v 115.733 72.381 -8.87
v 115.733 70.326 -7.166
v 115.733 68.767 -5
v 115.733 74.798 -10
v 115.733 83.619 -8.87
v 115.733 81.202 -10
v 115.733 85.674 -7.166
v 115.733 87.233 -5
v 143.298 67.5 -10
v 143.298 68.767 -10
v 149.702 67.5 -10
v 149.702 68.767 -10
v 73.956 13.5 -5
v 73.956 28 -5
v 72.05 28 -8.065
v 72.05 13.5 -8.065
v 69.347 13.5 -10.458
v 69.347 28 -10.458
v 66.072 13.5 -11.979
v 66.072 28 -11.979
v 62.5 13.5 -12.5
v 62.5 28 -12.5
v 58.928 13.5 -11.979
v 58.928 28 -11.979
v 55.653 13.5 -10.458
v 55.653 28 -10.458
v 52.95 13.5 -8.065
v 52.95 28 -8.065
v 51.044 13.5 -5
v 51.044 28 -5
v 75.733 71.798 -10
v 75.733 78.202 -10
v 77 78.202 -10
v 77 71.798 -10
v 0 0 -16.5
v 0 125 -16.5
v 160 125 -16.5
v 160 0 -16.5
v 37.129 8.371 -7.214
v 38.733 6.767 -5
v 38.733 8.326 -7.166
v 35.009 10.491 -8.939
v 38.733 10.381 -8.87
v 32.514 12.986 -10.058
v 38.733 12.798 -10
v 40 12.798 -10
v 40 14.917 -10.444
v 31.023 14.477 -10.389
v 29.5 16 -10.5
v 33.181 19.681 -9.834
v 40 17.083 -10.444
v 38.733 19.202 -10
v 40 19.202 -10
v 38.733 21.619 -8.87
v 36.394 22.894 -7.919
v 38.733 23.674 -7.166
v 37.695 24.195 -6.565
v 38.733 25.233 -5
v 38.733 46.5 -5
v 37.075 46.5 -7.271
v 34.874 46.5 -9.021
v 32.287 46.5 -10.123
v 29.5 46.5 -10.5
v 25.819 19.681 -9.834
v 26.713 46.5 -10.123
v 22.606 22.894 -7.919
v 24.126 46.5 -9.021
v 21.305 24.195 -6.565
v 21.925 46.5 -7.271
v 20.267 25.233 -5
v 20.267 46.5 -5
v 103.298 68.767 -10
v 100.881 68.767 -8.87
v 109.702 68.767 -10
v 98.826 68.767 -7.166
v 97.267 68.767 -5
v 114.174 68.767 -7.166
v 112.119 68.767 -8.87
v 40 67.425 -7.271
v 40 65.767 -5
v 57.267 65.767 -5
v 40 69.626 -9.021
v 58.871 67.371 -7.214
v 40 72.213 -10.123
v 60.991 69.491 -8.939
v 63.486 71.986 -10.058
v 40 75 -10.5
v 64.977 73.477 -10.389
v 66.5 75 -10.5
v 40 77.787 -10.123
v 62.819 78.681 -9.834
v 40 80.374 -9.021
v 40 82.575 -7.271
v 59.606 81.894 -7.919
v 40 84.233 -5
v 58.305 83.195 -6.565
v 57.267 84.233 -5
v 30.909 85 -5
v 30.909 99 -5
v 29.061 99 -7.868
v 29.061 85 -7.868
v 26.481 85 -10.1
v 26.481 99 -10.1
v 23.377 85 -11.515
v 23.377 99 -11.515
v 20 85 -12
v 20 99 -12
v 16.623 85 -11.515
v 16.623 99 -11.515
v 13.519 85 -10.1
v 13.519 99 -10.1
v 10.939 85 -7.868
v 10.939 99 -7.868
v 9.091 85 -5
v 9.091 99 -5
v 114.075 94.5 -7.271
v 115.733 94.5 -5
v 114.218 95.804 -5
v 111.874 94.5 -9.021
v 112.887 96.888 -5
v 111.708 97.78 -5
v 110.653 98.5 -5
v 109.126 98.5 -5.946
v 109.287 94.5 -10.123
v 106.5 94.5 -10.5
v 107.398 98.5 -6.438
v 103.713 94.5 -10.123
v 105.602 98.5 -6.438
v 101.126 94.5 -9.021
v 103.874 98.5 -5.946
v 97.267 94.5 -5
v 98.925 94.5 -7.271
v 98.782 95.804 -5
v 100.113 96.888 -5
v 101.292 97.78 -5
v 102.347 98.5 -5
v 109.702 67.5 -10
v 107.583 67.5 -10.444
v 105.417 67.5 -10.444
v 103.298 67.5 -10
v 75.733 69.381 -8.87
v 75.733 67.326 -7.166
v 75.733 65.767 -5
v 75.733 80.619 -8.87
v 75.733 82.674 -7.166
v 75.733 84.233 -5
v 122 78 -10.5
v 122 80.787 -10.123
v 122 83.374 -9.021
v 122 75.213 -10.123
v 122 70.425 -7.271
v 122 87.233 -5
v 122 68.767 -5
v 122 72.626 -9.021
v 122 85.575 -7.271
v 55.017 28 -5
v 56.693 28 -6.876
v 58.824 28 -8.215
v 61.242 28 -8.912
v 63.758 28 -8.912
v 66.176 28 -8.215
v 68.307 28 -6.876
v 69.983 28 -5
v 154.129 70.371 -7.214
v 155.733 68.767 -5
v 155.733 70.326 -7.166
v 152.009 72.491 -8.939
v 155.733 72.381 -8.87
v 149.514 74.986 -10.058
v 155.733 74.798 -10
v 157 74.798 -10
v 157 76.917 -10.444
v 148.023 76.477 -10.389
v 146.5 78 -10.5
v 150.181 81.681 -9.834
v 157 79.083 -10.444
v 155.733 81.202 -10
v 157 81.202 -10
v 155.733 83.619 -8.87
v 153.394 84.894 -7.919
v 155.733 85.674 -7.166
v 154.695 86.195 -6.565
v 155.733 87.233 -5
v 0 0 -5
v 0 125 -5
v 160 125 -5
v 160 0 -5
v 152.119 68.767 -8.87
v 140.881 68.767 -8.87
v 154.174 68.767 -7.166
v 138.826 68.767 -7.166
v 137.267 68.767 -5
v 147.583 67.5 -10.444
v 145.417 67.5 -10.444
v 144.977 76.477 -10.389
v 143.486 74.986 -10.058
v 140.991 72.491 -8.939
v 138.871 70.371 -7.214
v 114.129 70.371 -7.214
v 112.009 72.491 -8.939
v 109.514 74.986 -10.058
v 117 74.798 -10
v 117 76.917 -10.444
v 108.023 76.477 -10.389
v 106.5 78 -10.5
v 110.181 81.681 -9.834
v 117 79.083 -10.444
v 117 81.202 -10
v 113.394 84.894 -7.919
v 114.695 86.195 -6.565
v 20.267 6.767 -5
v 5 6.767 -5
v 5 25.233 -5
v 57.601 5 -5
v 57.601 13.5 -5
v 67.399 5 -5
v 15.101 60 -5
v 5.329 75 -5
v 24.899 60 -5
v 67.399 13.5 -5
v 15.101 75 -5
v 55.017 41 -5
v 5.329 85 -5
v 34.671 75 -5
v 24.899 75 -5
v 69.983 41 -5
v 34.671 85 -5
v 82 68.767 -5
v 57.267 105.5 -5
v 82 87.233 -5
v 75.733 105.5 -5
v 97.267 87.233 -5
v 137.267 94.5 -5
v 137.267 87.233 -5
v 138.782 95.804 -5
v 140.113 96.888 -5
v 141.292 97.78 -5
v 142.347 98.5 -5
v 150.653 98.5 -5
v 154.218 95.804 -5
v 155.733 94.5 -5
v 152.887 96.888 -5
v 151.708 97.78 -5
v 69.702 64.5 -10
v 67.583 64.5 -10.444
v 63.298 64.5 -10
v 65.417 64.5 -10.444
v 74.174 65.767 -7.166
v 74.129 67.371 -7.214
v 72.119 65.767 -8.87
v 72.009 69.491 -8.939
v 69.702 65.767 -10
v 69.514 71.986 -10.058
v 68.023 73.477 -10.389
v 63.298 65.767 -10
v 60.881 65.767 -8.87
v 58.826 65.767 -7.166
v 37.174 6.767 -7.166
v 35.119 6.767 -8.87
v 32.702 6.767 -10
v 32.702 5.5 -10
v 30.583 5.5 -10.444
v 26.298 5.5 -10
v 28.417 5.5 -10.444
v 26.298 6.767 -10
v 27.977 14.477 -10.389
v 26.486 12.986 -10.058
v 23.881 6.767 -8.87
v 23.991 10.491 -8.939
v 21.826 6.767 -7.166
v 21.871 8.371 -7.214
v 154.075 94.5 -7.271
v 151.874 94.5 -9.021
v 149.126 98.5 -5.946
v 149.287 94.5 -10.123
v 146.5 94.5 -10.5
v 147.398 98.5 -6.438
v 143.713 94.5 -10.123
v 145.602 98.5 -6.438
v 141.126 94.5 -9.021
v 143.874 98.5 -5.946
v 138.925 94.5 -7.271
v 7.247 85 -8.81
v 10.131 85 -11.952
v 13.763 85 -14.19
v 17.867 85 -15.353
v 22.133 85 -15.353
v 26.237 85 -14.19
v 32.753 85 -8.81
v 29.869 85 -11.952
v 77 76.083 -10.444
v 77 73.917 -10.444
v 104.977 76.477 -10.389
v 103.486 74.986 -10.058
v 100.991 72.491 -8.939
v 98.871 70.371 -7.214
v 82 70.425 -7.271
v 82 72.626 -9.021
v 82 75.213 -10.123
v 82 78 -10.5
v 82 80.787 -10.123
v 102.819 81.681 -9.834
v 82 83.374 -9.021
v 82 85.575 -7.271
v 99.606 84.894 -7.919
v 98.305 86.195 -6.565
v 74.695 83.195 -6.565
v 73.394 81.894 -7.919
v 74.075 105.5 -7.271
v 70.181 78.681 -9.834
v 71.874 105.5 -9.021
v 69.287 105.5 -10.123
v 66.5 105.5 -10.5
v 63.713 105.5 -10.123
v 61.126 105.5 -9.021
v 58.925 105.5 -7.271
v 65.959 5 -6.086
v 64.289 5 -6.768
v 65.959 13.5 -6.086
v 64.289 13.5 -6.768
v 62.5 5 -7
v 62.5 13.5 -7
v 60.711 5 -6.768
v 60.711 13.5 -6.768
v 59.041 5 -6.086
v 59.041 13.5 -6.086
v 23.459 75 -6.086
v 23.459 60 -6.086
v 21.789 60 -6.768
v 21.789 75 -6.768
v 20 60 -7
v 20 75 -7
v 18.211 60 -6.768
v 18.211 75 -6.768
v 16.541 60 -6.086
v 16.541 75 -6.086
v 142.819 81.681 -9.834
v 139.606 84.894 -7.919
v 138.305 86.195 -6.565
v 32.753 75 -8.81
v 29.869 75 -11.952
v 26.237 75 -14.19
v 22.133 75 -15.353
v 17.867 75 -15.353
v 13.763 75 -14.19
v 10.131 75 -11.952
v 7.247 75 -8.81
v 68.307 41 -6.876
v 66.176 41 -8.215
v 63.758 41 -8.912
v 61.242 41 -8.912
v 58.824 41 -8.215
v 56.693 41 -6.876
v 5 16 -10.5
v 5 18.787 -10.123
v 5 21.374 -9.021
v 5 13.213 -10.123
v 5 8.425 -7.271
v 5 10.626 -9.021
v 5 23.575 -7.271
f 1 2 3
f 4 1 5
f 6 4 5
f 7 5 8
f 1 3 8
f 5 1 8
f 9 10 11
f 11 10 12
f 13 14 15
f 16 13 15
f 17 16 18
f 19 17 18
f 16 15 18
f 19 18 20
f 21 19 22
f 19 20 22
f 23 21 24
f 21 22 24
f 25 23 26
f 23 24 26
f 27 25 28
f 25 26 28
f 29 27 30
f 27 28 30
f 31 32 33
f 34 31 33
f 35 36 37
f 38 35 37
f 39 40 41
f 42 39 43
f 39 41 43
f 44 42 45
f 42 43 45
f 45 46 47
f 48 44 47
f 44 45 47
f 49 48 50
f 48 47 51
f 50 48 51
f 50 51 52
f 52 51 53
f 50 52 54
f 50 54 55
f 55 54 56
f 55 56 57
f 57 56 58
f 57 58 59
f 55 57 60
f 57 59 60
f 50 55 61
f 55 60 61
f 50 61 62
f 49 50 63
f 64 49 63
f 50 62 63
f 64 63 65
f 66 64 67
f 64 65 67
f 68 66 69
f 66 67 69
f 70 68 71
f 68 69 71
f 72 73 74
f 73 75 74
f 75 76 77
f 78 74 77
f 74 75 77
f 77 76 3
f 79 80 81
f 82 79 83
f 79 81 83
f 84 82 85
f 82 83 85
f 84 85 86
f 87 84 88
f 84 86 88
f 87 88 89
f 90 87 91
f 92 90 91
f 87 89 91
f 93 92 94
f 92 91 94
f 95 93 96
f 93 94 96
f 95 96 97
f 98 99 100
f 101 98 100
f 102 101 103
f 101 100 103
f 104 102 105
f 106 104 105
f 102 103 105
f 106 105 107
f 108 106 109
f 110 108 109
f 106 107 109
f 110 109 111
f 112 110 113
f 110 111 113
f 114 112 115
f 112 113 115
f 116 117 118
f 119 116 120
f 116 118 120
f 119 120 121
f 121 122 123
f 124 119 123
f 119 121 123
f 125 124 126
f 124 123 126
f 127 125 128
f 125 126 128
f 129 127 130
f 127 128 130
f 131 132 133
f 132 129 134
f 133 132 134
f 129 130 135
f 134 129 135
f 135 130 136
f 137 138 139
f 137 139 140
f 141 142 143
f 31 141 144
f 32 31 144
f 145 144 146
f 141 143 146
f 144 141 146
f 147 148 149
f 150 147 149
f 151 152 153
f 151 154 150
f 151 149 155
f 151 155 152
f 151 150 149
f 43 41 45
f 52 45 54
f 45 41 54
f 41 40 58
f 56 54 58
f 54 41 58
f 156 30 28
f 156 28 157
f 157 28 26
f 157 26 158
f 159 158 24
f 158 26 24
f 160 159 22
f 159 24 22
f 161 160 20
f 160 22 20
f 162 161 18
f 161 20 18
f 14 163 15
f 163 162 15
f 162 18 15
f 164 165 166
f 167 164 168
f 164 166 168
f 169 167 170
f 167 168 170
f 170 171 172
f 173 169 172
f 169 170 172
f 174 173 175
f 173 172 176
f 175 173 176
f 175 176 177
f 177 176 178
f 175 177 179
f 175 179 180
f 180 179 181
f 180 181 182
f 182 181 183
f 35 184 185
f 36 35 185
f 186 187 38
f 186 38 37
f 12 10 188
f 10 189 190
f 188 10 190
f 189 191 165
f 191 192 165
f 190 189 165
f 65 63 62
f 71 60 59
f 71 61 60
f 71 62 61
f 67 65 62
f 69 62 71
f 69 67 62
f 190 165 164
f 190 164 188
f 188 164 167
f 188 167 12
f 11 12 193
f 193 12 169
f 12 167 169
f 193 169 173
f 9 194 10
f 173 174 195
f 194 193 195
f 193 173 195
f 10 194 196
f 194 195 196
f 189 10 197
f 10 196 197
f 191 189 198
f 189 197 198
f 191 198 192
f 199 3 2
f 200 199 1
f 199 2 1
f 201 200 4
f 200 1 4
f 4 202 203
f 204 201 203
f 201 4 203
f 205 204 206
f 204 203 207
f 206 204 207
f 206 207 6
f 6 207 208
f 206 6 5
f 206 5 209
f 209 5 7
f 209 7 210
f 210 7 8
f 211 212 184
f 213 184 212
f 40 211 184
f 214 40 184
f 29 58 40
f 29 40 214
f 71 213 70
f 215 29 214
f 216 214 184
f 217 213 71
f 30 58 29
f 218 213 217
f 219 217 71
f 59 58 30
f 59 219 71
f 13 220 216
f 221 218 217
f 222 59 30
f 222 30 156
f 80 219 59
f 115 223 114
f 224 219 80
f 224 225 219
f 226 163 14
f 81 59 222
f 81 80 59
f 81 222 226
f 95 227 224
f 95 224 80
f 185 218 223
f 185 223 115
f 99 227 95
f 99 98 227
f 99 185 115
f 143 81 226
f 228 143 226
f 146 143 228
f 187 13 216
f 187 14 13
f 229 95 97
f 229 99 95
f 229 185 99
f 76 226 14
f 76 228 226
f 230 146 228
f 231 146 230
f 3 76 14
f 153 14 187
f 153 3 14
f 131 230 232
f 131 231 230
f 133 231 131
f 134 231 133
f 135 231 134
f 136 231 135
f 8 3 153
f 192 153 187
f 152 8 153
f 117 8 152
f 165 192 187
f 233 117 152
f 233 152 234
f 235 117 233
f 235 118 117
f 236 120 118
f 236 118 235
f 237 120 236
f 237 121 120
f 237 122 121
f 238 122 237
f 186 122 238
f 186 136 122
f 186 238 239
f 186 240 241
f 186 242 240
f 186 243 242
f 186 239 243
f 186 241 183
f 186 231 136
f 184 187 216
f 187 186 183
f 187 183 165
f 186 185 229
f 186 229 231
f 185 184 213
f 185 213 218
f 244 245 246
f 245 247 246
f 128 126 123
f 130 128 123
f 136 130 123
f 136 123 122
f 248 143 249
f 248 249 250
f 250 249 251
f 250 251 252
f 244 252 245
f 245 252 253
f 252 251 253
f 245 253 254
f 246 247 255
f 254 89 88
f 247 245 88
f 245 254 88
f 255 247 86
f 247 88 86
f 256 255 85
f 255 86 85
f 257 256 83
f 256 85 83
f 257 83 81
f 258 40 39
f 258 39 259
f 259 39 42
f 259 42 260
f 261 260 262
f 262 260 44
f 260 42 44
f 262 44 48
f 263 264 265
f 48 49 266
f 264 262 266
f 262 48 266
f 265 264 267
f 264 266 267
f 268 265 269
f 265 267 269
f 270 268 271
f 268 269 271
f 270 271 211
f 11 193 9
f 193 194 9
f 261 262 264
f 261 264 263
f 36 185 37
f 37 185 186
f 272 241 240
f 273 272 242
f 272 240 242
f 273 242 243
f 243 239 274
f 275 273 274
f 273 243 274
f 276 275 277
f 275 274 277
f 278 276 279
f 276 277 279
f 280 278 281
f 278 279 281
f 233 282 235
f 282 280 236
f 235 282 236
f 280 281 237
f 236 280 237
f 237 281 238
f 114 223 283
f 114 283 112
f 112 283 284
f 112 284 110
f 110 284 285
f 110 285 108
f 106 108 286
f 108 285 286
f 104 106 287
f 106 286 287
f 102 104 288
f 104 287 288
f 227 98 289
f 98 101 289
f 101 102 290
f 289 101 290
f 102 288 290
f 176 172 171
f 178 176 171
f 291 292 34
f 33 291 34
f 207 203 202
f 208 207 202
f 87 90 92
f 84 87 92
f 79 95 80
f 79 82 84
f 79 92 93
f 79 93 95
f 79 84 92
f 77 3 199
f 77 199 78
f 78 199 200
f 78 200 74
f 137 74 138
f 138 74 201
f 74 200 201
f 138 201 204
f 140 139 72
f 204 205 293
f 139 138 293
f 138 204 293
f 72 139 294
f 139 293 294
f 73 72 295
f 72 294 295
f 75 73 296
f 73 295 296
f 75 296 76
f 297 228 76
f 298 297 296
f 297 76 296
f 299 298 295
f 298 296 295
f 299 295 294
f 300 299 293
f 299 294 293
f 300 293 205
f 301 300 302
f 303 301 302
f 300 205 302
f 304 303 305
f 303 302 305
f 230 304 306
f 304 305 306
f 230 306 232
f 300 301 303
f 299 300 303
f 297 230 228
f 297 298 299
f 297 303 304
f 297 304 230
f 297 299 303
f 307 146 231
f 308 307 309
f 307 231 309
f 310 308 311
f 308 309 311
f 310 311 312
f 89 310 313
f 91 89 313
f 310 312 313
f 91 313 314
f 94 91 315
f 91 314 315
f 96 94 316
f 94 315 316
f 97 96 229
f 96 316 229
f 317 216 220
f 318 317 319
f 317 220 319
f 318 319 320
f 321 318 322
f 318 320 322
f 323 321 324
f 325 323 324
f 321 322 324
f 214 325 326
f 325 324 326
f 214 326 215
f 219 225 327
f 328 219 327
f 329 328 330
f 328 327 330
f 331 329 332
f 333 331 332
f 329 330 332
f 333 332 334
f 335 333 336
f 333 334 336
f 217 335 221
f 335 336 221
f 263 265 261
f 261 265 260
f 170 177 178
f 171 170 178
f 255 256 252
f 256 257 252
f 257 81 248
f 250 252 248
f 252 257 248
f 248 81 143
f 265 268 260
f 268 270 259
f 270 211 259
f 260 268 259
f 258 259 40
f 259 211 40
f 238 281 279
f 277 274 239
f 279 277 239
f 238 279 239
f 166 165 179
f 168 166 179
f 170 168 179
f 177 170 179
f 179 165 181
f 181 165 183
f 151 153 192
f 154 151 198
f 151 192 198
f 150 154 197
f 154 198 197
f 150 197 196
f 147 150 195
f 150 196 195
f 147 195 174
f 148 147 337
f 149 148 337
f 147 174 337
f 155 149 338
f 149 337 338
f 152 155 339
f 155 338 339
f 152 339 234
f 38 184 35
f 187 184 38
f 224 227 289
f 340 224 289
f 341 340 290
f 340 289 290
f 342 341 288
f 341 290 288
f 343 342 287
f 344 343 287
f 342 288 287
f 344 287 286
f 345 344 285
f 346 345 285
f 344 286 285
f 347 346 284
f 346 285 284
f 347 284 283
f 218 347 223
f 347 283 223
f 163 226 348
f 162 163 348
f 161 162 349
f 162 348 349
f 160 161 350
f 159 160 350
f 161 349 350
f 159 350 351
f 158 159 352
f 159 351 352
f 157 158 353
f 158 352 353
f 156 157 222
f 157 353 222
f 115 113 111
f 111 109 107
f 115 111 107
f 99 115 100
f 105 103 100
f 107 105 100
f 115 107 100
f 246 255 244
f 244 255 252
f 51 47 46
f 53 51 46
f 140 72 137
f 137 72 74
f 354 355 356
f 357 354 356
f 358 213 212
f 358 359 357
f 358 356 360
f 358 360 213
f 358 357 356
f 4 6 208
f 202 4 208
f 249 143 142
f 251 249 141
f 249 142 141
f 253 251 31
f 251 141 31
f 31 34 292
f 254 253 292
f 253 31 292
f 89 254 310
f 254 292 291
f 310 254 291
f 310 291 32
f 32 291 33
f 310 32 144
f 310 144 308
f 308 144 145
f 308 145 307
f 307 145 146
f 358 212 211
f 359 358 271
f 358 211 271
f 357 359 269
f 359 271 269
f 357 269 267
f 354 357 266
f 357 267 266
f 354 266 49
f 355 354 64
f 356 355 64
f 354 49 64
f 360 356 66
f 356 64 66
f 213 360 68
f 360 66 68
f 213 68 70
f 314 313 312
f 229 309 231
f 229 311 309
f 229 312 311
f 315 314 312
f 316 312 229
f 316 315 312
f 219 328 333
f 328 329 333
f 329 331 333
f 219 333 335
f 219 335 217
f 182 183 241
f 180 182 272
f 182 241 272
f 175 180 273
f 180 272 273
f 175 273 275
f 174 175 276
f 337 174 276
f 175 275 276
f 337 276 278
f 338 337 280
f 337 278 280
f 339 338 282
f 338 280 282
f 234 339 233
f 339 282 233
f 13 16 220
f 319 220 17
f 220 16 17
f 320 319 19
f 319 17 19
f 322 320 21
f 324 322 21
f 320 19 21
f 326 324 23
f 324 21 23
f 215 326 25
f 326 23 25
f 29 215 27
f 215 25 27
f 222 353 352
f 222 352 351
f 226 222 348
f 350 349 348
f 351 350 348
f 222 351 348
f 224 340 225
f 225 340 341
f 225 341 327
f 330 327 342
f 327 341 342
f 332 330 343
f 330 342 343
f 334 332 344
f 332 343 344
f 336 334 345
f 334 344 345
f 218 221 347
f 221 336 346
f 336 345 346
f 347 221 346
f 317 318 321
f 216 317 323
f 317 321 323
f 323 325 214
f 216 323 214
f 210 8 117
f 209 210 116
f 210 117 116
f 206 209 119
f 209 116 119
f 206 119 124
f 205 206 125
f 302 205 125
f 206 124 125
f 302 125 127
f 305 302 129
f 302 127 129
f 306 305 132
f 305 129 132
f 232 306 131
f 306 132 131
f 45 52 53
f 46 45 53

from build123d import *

# Parameters (mm, degrees)
F0_W      = 160
F0_H      = 125
F1_DEPTH  = 16.5
F4_W      = 35
F4_H      = 10.5
F6_W      = 37
F6_H      = 10.5
F8_W      = 10.5
F8_H      = 20
F8_H_2    = 21
F10_W     = 35
F10_H     = 10.5
F12_W     = 10.5
F12_H     = 21
F14_W     = 10.5
F14_H     = 21
F16_W     = 10.5
F16_H     = 20
F16_H_2   = 21
F20_W     = 160
F20_H     = 5
F21_DEPTH = 160
F22_W     = 1.2669073437
F22_H     = 18.4661853126
F22_W_2   = 18.4661853126
F22_H_2   = 1.2669073437
F23_DEPTH = 5


with BuildPart() as f1:
    # F0 (on Top) → F1 (new body)
    with BuildSketch(Plane.XY):
        with Locations((80, 62.5)):
            Rectangle(F0_W, F0_H)
    extrude(amount=-F1_DEPTH)

    # F2 (on face) → F3 (revolve, cut)
    with BuildSketch(Plane.XY):
        Polygon((20, 75), (20, 60), (27, 60), (27, 75), (35.5, 75), (35.5, 85), (32, 85), (32, 99), (24.5, 99), (24.5, 113), (20, 113), (20, 99), (20, 85), align=None)
    revolve(axis=Axis((20, 92, 0), (0, 1, 0)), mode=Mode.SUBTRACT)

    # F4 (on face) → F5 (revolve, cut)
    with BuildSketch(Plane.XY):
        with Locations((22.5, 10.75)):
            Rectangle(F4_W, F4_H)
    revolve(axis=Axis((22.5, 16, 0), (1, 0, 0)), mode=Mode.SUBTRACT)

    # F6 (on face) → F7 (revolve, cut)
    with BuildSketch(Plane.XY):
        with Locations((58.5, 69.75)):
            Rectangle(F6_W, F6_H)
    revolve(axis=Axis((58.5, 75, 0), (1, 0, 0)), mode=Mode.SUBTRACT)

    # F8 (on face) → F9 (revolve, cut)
    with BuildSketch(Plane.XY):
        with Locations((71.75, 95.5)):
            Rectangle(F8_W, F8_H)
        with Locations((71.75, 75)):
            Rectangle(F8_W, F8_H_2)
    revolve(axis=Axis((66.5, 85, 0), (0, 1, 0)), mode=Mode.SUBTRACT)

    # F10 (on face) → F11 (revolve, cut)
    with BuildSketch(Plane.XY):
        with Locations((99.5, 72.75)):
            Rectangle(F10_W, F10_H)
        with Locations((139.5, 72.75)):
            Rectangle(F10_W, F10_H)
    revolve(axis=Axis((99.5, 78, 0), (1, 0, 0)), mode=Mode.SUBTRACT)

    # F12 (on face) → F13 (revolve, cut)
    with BuildSketch(Plane.XY):
        Polygon((106.5, 88.5), (117, 88.5), (117, 94.5), (113, 98.5), (106.5, 98.5), align=None)
        with Locations((111.75, 78)):
            Rectangle(F12_W, F12_H)
    revolve(axis=Axis((106.5, 83, 0), (0, 1, 0)), mode=Mode.SUBTRACT)

    # F14 (on face) → F15 (revolve, cut)
    with BuildSketch(Plane.XY):
        Polygon((146.5, 88.5), (157, 88.5), (157, 94.5), (153, 98.5), (146.5, 98.5), align=None)
        with Locations((151.75, 78)):
            Rectangle(F14_W, F14_H)
    revolve(axis=Axis((146.5, 83, 0), (0, 1, 0)), mode=Mode.SUBTRACT)

    # F16 (on face) → F17 (revolve, cut)
    with BuildSketch(Plane.XY):
        with Locations((34.75, 36.5)):
            Rectangle(F16_W, F16_H)
        with Locations((34.75, 16)):
            Rectangle(F16_W, F16_H_2)
    revolve(axis=Axis((29.5, 26, 0), (0, 1, 0)), mode=Mode.SUBTRACT)

    # F18 (on face) → F19 (revolve, cut)
    with BuildSketch(Plane.XY):
        Polygon((62.5, 13.5), (62.5, 5), (69.5, 5), (69.5, 13.5), (75, 13.5), (75, 28), (71.5, 28), (71.5, 41), (62.5, 41), (62.5, 28), align=None)
    revolve(axis=Axis((62.5, 20.75, 0), (0, 1, 0)), mode=Mode.SUBTRACT)

    # F20 (on face) → F21 (cut)
    with BuildSketch(Plane.XZ):
        with Locations((80, -2.5)):
            Rectangle(F20_W, F20_H)
    extrude(amount=-F21_DEPTH, mode=Mode.SUBTRACT)

    # F22 (on face) → F23 (join)
    with BuildSketch(Plane.XY.offset(-5)):
        with Locations((39.3665463282, 16)):
            Rectangle(F22_W, F22_H)
        with Locations((29.5, 6.1334536718)):
            Rectangle(F22_W_2, F22_H_2)
        with Locations((76.3665463282, 75)):
            Rectangle(F22_W, F22_H)
        with Locations((66.5, 65.1334536718)):
            Rectangle(F22_W_2, F22_H_2)
        with Locations((116.3665463282, 78)):
            Rectangle(F22_W, F22_H)
        with Locations((106.5, 68.1334536718)):
            Rectangle(F22_W_2, F22_H_2)
        with Locations((156.3665463282, 78)):
            Rectangle(F22_W, F22_H)
        with Locations((146.5, 68.1334536718)):
            Rectangle(F22_W_2, F22_H_2)
    extrude(amount=-F23_DEPTH)


solid = f1.part
